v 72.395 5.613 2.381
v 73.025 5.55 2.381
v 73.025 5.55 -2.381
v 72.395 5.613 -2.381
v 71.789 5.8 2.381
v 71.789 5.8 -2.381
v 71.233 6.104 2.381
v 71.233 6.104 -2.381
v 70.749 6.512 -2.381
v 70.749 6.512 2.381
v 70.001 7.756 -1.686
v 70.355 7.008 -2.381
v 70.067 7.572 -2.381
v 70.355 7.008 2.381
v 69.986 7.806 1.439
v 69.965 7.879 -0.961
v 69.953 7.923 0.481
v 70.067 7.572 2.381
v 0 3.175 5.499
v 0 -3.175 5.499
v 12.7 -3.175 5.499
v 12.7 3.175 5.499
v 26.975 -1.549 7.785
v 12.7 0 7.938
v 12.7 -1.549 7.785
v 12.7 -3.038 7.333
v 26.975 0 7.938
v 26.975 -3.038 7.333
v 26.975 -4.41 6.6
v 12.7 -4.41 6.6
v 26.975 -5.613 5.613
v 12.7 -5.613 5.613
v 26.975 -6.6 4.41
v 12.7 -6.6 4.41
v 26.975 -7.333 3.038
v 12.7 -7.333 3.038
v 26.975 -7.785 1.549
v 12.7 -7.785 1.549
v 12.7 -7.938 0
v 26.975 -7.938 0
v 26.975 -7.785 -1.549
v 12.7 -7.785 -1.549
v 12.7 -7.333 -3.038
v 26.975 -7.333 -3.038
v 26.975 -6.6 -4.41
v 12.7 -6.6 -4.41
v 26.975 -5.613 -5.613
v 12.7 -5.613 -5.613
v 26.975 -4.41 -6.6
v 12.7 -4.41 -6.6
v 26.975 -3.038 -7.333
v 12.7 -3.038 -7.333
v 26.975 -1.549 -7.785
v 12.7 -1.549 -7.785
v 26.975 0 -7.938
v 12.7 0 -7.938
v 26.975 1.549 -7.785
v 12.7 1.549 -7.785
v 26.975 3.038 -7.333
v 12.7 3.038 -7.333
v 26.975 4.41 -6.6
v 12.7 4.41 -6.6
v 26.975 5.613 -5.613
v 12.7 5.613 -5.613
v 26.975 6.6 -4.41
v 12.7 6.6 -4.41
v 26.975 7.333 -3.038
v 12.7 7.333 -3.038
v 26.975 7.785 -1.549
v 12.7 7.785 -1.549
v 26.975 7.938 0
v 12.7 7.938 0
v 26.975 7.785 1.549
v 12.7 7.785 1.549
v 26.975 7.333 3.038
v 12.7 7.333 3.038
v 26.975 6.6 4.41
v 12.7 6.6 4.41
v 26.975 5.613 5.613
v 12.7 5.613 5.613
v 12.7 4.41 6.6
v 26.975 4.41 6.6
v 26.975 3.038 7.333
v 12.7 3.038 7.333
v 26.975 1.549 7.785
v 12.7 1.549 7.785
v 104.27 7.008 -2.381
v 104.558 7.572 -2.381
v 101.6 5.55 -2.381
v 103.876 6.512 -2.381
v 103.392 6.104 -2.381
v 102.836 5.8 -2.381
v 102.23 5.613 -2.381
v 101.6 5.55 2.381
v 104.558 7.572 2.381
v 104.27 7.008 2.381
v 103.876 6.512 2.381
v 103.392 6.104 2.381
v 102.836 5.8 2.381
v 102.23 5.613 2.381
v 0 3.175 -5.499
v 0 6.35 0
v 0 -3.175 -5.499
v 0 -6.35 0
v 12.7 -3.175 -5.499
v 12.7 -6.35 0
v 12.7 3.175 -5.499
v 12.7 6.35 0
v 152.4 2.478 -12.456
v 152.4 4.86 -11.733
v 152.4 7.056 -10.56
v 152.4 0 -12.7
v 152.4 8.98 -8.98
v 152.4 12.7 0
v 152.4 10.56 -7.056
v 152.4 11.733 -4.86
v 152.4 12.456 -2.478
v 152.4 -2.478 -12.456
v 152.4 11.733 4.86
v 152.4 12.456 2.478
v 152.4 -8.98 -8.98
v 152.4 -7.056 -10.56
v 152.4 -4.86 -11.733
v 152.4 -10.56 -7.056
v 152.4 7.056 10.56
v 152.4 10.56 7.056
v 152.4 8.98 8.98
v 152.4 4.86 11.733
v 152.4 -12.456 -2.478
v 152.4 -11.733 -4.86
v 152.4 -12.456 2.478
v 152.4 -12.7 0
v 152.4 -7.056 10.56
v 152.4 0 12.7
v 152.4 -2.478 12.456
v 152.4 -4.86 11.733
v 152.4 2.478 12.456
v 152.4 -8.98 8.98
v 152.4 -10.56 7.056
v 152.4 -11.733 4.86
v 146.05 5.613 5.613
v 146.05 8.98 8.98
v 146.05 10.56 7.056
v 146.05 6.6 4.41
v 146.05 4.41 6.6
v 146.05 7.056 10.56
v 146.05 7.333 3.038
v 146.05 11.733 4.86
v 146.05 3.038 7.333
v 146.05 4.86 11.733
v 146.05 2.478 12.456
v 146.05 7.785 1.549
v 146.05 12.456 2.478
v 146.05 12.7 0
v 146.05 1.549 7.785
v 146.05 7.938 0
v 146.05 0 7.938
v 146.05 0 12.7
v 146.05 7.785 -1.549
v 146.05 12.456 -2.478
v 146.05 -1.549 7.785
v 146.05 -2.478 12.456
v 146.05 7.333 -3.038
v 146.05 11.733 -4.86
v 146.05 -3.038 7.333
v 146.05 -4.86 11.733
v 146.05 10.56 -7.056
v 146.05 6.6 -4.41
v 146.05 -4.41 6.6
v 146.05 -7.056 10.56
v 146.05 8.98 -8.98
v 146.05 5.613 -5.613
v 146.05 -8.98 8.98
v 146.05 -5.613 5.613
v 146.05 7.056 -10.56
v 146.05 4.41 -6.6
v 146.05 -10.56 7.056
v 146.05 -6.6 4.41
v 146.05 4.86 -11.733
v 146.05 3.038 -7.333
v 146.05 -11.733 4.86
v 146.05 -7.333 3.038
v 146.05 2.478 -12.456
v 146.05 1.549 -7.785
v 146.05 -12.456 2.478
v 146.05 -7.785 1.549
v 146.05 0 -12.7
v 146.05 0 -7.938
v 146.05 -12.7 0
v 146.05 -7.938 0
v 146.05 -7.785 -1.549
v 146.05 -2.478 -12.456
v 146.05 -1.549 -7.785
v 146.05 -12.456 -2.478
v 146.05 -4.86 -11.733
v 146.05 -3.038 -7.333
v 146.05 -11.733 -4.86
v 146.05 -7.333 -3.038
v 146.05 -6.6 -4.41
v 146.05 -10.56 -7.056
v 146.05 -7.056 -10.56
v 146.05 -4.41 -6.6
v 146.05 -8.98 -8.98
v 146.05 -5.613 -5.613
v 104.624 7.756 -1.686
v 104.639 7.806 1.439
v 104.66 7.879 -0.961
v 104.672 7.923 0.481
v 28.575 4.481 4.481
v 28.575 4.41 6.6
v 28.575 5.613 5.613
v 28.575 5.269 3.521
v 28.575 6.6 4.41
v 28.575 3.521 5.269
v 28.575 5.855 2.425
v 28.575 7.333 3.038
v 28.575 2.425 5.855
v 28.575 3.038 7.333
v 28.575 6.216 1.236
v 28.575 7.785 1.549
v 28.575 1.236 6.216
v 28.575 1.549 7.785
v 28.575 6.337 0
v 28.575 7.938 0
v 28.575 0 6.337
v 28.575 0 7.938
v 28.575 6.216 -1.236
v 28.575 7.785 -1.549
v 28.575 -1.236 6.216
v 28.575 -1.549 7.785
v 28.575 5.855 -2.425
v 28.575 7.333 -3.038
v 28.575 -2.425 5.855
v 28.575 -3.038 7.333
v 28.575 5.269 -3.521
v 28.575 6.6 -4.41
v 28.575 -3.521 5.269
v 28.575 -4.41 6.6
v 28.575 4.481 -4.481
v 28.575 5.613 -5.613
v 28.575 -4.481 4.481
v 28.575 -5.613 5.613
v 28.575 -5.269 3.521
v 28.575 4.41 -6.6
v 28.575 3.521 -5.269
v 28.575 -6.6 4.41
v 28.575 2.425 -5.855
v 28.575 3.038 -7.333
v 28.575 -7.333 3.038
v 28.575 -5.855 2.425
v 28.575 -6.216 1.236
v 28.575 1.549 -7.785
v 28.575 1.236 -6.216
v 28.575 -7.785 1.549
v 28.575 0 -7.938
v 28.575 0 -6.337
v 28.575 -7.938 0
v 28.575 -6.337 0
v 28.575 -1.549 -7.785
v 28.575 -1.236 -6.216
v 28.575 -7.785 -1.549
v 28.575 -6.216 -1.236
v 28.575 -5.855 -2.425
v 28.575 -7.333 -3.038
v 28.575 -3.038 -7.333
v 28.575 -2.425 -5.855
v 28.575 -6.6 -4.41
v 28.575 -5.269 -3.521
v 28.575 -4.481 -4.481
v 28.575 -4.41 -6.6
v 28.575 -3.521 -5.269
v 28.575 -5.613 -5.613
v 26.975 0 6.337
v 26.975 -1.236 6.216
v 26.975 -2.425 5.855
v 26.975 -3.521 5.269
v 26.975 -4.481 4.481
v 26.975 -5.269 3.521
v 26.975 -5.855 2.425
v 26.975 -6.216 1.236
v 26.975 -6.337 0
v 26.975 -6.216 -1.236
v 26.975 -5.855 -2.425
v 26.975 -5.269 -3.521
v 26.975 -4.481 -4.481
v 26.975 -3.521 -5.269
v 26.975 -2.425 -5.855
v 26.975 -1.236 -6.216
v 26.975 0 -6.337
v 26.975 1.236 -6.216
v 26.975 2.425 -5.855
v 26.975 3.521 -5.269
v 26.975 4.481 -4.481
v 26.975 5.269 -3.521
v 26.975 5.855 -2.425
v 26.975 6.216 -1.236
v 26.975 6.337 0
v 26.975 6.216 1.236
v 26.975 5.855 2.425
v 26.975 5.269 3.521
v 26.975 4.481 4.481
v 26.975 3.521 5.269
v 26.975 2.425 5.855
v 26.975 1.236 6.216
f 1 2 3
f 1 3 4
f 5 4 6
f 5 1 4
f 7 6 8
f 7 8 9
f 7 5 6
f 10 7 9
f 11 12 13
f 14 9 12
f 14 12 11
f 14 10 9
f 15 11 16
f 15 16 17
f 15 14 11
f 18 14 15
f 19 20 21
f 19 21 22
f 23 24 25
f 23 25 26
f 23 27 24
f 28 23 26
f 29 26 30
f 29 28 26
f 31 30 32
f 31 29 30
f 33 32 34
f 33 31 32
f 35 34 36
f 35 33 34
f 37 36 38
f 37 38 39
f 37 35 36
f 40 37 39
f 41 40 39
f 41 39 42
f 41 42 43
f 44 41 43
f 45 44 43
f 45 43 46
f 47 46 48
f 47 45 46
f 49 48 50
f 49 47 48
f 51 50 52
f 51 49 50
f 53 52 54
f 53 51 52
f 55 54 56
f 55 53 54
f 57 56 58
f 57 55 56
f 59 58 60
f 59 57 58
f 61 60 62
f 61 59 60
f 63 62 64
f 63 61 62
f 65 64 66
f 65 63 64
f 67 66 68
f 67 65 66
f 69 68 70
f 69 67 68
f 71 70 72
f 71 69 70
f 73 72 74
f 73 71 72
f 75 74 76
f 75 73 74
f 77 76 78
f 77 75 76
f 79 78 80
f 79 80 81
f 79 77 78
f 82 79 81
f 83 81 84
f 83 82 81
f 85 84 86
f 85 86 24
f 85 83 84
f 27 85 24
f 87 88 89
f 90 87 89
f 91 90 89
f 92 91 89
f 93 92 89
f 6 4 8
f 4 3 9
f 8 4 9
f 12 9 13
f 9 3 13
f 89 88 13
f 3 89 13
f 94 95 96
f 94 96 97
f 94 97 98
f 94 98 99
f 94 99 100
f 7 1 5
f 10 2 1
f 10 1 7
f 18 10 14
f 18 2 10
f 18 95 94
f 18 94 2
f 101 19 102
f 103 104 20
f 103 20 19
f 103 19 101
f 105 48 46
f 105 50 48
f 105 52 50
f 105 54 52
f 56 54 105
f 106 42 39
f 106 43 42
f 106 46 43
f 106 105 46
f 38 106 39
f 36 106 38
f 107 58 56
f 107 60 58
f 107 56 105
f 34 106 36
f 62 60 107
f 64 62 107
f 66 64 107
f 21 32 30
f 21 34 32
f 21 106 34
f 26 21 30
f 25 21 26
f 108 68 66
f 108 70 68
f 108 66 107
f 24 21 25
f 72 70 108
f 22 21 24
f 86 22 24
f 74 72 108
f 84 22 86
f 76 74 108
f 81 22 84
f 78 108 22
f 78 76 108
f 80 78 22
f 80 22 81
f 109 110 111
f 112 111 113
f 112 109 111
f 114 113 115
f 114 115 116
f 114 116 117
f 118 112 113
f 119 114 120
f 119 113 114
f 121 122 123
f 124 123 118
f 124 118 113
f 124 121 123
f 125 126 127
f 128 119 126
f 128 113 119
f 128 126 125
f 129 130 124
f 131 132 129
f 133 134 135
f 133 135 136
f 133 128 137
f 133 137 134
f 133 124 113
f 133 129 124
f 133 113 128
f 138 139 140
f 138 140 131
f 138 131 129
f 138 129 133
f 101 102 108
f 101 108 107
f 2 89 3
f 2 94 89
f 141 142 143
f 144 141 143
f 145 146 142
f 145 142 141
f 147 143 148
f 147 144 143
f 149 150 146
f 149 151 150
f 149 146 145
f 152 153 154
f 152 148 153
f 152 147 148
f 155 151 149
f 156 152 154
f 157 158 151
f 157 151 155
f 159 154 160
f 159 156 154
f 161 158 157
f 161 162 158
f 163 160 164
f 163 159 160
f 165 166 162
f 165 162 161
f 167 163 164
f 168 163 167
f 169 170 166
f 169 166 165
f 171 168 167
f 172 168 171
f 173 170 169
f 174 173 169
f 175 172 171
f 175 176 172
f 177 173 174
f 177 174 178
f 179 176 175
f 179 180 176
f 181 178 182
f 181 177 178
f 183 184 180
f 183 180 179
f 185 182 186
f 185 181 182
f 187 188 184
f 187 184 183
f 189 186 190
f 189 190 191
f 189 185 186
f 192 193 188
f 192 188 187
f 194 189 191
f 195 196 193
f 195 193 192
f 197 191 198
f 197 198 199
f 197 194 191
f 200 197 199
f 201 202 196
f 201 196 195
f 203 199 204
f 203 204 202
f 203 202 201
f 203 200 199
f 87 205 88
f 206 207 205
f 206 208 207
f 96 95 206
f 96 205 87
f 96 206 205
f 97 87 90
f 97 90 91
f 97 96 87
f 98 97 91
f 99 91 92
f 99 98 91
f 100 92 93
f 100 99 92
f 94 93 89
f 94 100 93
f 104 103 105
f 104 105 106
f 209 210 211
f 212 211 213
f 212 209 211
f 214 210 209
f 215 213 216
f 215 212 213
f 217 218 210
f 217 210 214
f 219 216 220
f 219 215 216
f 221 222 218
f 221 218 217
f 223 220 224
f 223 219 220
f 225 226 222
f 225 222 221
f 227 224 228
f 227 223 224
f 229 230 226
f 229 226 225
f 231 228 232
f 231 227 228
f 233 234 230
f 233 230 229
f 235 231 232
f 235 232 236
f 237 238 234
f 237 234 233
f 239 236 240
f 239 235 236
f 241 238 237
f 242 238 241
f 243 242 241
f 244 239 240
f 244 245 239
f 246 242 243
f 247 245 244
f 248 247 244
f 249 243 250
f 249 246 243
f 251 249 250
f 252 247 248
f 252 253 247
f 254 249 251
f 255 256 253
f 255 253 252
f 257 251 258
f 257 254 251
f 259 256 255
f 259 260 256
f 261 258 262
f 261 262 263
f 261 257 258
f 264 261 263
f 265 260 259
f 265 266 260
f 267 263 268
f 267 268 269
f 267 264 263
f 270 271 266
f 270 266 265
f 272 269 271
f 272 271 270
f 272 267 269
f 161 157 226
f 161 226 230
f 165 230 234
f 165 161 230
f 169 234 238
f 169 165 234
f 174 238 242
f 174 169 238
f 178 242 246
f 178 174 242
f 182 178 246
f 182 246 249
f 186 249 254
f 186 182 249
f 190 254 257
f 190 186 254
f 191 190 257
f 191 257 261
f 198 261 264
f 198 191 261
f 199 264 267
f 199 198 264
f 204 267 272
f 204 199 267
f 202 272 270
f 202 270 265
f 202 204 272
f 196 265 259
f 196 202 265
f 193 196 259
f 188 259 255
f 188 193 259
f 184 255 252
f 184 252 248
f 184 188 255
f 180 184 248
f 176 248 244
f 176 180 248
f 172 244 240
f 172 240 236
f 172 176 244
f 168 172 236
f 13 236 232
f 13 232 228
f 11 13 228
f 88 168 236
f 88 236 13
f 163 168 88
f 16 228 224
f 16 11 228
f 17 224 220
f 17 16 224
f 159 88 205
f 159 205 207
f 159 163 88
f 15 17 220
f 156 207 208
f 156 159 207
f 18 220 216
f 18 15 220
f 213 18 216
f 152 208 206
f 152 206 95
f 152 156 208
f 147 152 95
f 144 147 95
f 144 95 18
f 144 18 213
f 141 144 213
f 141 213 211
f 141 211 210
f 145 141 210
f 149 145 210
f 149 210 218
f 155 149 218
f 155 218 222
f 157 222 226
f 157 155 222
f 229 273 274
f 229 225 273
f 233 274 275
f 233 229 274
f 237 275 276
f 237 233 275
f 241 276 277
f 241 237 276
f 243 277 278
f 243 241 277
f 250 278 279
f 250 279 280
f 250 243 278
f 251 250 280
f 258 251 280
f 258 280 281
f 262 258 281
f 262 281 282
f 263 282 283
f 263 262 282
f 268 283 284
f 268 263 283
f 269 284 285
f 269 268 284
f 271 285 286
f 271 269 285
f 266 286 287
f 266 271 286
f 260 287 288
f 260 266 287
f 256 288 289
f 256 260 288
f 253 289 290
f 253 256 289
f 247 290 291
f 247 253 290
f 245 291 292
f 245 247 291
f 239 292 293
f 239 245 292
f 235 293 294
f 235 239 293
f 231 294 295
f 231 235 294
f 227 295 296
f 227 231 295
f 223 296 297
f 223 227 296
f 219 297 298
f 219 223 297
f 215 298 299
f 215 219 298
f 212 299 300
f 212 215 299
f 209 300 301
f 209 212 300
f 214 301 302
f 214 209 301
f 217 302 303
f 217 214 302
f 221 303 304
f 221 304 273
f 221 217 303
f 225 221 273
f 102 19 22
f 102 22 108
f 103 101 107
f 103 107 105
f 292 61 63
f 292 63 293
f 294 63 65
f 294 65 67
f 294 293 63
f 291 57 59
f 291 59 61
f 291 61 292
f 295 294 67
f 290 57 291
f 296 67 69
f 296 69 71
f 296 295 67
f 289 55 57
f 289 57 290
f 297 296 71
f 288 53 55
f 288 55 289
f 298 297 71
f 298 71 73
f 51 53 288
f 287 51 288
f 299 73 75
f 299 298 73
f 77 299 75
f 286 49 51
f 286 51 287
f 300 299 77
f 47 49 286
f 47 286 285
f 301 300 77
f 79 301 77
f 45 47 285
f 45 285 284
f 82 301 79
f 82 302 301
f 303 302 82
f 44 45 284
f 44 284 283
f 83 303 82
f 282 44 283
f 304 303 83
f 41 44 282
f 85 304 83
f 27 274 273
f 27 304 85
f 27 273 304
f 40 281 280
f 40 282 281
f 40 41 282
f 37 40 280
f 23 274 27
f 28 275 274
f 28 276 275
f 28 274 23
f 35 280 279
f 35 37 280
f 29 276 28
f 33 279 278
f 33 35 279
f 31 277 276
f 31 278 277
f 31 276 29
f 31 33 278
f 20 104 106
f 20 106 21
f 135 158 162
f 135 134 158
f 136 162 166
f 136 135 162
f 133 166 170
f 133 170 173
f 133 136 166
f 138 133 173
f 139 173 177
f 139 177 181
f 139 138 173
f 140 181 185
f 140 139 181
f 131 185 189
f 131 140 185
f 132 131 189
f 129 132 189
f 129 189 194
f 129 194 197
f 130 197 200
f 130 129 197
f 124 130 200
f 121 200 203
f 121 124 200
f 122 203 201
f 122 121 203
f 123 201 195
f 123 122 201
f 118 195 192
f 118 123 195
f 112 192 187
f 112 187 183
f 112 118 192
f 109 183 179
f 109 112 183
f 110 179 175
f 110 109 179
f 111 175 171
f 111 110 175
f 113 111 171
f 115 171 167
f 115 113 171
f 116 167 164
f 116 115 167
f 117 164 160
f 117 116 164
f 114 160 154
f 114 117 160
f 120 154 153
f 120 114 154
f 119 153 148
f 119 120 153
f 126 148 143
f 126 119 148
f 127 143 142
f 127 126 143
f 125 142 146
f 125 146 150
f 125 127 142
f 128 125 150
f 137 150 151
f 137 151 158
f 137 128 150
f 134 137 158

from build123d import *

# Parameters (mm, degrees)
CUT_EXTRUDE1_DEPTH = 2.38125
SKETCH6_OUTSIDE_W  = 58.716
SKETCH6_OUTSIDE_H  = 58.716
CUT_EXTRUDE2_DEPTH = 12.7


with BuildPart() as part:
    # Sketch2 → Revolve1 (revolve)
    with BuildSketch(Plane.XY, mode=Mode.PRIVATE) as revolve1_sk:
        Polygon((0, 0), (0, 6.35), (12.7, 6.35), (12.7, 7.9375), (26.9748, 7.9375), (26.9748, 6.3373), (28.575, 6.3373), (28.575, 7.9375), (146.05, 7.9375), (146.05, 12.7), (152.4, 12.7), (152.4, 0), align=None)
    revolve(revolve1_sk.sketch.rotate(Axis((-160.725070543, 0, 0), (1, 0, 0)), 90), axis=Axis((-160.725070543, 0, 0), (1, 0, 0)))

    # Sketch3 → Cut-Extrude1 (cut, symmetric)
    with BuildSketch(Plane.XY):
        with BuildLine():
            Line((69.85, 14.2875), (104.775, 14.2875))
            Line((104.775, 14.2875), (104.775, 8.7249))
            ThreePointArc((104.775, 8.7249), (103.84506403, 6.47983597), (101.6, 5.5499))
            Line((101.6, 5.5499), (73.025, 5.5499))
            ThreePointArc((73.025, 5.5499), (70.77993597, 6.47983597), (69.85, 8.7249))
            Line((69.85, 8.7249), (69.85, 14.2875))
        make_face()
    extrude(amount=CUT_EXTRUDE1_DEPTH, both=True, mode=Mode.SUBTRACT)

    # Sketch6 outside → Cut-Extrude2 (cut)
    with BuildSketch(Plane.ZY):
        Rectangle(SKETCH6_OUTSIDE_W, SKETCH6_OUTSIDE_H)
        Polygon((0, 6.35), (-5.499261314, 3.175), (-5.499261314, -3.175), (0, -6.35), (5.499261314, -3.175), (5.499261314, 3.175), align=None, mode=Mode.SUBTRACT)
    extrude(amount=-CUT_EXTRUDE2_DEPTH, mode=Mode.SUBTRACT)


solid = part.part
